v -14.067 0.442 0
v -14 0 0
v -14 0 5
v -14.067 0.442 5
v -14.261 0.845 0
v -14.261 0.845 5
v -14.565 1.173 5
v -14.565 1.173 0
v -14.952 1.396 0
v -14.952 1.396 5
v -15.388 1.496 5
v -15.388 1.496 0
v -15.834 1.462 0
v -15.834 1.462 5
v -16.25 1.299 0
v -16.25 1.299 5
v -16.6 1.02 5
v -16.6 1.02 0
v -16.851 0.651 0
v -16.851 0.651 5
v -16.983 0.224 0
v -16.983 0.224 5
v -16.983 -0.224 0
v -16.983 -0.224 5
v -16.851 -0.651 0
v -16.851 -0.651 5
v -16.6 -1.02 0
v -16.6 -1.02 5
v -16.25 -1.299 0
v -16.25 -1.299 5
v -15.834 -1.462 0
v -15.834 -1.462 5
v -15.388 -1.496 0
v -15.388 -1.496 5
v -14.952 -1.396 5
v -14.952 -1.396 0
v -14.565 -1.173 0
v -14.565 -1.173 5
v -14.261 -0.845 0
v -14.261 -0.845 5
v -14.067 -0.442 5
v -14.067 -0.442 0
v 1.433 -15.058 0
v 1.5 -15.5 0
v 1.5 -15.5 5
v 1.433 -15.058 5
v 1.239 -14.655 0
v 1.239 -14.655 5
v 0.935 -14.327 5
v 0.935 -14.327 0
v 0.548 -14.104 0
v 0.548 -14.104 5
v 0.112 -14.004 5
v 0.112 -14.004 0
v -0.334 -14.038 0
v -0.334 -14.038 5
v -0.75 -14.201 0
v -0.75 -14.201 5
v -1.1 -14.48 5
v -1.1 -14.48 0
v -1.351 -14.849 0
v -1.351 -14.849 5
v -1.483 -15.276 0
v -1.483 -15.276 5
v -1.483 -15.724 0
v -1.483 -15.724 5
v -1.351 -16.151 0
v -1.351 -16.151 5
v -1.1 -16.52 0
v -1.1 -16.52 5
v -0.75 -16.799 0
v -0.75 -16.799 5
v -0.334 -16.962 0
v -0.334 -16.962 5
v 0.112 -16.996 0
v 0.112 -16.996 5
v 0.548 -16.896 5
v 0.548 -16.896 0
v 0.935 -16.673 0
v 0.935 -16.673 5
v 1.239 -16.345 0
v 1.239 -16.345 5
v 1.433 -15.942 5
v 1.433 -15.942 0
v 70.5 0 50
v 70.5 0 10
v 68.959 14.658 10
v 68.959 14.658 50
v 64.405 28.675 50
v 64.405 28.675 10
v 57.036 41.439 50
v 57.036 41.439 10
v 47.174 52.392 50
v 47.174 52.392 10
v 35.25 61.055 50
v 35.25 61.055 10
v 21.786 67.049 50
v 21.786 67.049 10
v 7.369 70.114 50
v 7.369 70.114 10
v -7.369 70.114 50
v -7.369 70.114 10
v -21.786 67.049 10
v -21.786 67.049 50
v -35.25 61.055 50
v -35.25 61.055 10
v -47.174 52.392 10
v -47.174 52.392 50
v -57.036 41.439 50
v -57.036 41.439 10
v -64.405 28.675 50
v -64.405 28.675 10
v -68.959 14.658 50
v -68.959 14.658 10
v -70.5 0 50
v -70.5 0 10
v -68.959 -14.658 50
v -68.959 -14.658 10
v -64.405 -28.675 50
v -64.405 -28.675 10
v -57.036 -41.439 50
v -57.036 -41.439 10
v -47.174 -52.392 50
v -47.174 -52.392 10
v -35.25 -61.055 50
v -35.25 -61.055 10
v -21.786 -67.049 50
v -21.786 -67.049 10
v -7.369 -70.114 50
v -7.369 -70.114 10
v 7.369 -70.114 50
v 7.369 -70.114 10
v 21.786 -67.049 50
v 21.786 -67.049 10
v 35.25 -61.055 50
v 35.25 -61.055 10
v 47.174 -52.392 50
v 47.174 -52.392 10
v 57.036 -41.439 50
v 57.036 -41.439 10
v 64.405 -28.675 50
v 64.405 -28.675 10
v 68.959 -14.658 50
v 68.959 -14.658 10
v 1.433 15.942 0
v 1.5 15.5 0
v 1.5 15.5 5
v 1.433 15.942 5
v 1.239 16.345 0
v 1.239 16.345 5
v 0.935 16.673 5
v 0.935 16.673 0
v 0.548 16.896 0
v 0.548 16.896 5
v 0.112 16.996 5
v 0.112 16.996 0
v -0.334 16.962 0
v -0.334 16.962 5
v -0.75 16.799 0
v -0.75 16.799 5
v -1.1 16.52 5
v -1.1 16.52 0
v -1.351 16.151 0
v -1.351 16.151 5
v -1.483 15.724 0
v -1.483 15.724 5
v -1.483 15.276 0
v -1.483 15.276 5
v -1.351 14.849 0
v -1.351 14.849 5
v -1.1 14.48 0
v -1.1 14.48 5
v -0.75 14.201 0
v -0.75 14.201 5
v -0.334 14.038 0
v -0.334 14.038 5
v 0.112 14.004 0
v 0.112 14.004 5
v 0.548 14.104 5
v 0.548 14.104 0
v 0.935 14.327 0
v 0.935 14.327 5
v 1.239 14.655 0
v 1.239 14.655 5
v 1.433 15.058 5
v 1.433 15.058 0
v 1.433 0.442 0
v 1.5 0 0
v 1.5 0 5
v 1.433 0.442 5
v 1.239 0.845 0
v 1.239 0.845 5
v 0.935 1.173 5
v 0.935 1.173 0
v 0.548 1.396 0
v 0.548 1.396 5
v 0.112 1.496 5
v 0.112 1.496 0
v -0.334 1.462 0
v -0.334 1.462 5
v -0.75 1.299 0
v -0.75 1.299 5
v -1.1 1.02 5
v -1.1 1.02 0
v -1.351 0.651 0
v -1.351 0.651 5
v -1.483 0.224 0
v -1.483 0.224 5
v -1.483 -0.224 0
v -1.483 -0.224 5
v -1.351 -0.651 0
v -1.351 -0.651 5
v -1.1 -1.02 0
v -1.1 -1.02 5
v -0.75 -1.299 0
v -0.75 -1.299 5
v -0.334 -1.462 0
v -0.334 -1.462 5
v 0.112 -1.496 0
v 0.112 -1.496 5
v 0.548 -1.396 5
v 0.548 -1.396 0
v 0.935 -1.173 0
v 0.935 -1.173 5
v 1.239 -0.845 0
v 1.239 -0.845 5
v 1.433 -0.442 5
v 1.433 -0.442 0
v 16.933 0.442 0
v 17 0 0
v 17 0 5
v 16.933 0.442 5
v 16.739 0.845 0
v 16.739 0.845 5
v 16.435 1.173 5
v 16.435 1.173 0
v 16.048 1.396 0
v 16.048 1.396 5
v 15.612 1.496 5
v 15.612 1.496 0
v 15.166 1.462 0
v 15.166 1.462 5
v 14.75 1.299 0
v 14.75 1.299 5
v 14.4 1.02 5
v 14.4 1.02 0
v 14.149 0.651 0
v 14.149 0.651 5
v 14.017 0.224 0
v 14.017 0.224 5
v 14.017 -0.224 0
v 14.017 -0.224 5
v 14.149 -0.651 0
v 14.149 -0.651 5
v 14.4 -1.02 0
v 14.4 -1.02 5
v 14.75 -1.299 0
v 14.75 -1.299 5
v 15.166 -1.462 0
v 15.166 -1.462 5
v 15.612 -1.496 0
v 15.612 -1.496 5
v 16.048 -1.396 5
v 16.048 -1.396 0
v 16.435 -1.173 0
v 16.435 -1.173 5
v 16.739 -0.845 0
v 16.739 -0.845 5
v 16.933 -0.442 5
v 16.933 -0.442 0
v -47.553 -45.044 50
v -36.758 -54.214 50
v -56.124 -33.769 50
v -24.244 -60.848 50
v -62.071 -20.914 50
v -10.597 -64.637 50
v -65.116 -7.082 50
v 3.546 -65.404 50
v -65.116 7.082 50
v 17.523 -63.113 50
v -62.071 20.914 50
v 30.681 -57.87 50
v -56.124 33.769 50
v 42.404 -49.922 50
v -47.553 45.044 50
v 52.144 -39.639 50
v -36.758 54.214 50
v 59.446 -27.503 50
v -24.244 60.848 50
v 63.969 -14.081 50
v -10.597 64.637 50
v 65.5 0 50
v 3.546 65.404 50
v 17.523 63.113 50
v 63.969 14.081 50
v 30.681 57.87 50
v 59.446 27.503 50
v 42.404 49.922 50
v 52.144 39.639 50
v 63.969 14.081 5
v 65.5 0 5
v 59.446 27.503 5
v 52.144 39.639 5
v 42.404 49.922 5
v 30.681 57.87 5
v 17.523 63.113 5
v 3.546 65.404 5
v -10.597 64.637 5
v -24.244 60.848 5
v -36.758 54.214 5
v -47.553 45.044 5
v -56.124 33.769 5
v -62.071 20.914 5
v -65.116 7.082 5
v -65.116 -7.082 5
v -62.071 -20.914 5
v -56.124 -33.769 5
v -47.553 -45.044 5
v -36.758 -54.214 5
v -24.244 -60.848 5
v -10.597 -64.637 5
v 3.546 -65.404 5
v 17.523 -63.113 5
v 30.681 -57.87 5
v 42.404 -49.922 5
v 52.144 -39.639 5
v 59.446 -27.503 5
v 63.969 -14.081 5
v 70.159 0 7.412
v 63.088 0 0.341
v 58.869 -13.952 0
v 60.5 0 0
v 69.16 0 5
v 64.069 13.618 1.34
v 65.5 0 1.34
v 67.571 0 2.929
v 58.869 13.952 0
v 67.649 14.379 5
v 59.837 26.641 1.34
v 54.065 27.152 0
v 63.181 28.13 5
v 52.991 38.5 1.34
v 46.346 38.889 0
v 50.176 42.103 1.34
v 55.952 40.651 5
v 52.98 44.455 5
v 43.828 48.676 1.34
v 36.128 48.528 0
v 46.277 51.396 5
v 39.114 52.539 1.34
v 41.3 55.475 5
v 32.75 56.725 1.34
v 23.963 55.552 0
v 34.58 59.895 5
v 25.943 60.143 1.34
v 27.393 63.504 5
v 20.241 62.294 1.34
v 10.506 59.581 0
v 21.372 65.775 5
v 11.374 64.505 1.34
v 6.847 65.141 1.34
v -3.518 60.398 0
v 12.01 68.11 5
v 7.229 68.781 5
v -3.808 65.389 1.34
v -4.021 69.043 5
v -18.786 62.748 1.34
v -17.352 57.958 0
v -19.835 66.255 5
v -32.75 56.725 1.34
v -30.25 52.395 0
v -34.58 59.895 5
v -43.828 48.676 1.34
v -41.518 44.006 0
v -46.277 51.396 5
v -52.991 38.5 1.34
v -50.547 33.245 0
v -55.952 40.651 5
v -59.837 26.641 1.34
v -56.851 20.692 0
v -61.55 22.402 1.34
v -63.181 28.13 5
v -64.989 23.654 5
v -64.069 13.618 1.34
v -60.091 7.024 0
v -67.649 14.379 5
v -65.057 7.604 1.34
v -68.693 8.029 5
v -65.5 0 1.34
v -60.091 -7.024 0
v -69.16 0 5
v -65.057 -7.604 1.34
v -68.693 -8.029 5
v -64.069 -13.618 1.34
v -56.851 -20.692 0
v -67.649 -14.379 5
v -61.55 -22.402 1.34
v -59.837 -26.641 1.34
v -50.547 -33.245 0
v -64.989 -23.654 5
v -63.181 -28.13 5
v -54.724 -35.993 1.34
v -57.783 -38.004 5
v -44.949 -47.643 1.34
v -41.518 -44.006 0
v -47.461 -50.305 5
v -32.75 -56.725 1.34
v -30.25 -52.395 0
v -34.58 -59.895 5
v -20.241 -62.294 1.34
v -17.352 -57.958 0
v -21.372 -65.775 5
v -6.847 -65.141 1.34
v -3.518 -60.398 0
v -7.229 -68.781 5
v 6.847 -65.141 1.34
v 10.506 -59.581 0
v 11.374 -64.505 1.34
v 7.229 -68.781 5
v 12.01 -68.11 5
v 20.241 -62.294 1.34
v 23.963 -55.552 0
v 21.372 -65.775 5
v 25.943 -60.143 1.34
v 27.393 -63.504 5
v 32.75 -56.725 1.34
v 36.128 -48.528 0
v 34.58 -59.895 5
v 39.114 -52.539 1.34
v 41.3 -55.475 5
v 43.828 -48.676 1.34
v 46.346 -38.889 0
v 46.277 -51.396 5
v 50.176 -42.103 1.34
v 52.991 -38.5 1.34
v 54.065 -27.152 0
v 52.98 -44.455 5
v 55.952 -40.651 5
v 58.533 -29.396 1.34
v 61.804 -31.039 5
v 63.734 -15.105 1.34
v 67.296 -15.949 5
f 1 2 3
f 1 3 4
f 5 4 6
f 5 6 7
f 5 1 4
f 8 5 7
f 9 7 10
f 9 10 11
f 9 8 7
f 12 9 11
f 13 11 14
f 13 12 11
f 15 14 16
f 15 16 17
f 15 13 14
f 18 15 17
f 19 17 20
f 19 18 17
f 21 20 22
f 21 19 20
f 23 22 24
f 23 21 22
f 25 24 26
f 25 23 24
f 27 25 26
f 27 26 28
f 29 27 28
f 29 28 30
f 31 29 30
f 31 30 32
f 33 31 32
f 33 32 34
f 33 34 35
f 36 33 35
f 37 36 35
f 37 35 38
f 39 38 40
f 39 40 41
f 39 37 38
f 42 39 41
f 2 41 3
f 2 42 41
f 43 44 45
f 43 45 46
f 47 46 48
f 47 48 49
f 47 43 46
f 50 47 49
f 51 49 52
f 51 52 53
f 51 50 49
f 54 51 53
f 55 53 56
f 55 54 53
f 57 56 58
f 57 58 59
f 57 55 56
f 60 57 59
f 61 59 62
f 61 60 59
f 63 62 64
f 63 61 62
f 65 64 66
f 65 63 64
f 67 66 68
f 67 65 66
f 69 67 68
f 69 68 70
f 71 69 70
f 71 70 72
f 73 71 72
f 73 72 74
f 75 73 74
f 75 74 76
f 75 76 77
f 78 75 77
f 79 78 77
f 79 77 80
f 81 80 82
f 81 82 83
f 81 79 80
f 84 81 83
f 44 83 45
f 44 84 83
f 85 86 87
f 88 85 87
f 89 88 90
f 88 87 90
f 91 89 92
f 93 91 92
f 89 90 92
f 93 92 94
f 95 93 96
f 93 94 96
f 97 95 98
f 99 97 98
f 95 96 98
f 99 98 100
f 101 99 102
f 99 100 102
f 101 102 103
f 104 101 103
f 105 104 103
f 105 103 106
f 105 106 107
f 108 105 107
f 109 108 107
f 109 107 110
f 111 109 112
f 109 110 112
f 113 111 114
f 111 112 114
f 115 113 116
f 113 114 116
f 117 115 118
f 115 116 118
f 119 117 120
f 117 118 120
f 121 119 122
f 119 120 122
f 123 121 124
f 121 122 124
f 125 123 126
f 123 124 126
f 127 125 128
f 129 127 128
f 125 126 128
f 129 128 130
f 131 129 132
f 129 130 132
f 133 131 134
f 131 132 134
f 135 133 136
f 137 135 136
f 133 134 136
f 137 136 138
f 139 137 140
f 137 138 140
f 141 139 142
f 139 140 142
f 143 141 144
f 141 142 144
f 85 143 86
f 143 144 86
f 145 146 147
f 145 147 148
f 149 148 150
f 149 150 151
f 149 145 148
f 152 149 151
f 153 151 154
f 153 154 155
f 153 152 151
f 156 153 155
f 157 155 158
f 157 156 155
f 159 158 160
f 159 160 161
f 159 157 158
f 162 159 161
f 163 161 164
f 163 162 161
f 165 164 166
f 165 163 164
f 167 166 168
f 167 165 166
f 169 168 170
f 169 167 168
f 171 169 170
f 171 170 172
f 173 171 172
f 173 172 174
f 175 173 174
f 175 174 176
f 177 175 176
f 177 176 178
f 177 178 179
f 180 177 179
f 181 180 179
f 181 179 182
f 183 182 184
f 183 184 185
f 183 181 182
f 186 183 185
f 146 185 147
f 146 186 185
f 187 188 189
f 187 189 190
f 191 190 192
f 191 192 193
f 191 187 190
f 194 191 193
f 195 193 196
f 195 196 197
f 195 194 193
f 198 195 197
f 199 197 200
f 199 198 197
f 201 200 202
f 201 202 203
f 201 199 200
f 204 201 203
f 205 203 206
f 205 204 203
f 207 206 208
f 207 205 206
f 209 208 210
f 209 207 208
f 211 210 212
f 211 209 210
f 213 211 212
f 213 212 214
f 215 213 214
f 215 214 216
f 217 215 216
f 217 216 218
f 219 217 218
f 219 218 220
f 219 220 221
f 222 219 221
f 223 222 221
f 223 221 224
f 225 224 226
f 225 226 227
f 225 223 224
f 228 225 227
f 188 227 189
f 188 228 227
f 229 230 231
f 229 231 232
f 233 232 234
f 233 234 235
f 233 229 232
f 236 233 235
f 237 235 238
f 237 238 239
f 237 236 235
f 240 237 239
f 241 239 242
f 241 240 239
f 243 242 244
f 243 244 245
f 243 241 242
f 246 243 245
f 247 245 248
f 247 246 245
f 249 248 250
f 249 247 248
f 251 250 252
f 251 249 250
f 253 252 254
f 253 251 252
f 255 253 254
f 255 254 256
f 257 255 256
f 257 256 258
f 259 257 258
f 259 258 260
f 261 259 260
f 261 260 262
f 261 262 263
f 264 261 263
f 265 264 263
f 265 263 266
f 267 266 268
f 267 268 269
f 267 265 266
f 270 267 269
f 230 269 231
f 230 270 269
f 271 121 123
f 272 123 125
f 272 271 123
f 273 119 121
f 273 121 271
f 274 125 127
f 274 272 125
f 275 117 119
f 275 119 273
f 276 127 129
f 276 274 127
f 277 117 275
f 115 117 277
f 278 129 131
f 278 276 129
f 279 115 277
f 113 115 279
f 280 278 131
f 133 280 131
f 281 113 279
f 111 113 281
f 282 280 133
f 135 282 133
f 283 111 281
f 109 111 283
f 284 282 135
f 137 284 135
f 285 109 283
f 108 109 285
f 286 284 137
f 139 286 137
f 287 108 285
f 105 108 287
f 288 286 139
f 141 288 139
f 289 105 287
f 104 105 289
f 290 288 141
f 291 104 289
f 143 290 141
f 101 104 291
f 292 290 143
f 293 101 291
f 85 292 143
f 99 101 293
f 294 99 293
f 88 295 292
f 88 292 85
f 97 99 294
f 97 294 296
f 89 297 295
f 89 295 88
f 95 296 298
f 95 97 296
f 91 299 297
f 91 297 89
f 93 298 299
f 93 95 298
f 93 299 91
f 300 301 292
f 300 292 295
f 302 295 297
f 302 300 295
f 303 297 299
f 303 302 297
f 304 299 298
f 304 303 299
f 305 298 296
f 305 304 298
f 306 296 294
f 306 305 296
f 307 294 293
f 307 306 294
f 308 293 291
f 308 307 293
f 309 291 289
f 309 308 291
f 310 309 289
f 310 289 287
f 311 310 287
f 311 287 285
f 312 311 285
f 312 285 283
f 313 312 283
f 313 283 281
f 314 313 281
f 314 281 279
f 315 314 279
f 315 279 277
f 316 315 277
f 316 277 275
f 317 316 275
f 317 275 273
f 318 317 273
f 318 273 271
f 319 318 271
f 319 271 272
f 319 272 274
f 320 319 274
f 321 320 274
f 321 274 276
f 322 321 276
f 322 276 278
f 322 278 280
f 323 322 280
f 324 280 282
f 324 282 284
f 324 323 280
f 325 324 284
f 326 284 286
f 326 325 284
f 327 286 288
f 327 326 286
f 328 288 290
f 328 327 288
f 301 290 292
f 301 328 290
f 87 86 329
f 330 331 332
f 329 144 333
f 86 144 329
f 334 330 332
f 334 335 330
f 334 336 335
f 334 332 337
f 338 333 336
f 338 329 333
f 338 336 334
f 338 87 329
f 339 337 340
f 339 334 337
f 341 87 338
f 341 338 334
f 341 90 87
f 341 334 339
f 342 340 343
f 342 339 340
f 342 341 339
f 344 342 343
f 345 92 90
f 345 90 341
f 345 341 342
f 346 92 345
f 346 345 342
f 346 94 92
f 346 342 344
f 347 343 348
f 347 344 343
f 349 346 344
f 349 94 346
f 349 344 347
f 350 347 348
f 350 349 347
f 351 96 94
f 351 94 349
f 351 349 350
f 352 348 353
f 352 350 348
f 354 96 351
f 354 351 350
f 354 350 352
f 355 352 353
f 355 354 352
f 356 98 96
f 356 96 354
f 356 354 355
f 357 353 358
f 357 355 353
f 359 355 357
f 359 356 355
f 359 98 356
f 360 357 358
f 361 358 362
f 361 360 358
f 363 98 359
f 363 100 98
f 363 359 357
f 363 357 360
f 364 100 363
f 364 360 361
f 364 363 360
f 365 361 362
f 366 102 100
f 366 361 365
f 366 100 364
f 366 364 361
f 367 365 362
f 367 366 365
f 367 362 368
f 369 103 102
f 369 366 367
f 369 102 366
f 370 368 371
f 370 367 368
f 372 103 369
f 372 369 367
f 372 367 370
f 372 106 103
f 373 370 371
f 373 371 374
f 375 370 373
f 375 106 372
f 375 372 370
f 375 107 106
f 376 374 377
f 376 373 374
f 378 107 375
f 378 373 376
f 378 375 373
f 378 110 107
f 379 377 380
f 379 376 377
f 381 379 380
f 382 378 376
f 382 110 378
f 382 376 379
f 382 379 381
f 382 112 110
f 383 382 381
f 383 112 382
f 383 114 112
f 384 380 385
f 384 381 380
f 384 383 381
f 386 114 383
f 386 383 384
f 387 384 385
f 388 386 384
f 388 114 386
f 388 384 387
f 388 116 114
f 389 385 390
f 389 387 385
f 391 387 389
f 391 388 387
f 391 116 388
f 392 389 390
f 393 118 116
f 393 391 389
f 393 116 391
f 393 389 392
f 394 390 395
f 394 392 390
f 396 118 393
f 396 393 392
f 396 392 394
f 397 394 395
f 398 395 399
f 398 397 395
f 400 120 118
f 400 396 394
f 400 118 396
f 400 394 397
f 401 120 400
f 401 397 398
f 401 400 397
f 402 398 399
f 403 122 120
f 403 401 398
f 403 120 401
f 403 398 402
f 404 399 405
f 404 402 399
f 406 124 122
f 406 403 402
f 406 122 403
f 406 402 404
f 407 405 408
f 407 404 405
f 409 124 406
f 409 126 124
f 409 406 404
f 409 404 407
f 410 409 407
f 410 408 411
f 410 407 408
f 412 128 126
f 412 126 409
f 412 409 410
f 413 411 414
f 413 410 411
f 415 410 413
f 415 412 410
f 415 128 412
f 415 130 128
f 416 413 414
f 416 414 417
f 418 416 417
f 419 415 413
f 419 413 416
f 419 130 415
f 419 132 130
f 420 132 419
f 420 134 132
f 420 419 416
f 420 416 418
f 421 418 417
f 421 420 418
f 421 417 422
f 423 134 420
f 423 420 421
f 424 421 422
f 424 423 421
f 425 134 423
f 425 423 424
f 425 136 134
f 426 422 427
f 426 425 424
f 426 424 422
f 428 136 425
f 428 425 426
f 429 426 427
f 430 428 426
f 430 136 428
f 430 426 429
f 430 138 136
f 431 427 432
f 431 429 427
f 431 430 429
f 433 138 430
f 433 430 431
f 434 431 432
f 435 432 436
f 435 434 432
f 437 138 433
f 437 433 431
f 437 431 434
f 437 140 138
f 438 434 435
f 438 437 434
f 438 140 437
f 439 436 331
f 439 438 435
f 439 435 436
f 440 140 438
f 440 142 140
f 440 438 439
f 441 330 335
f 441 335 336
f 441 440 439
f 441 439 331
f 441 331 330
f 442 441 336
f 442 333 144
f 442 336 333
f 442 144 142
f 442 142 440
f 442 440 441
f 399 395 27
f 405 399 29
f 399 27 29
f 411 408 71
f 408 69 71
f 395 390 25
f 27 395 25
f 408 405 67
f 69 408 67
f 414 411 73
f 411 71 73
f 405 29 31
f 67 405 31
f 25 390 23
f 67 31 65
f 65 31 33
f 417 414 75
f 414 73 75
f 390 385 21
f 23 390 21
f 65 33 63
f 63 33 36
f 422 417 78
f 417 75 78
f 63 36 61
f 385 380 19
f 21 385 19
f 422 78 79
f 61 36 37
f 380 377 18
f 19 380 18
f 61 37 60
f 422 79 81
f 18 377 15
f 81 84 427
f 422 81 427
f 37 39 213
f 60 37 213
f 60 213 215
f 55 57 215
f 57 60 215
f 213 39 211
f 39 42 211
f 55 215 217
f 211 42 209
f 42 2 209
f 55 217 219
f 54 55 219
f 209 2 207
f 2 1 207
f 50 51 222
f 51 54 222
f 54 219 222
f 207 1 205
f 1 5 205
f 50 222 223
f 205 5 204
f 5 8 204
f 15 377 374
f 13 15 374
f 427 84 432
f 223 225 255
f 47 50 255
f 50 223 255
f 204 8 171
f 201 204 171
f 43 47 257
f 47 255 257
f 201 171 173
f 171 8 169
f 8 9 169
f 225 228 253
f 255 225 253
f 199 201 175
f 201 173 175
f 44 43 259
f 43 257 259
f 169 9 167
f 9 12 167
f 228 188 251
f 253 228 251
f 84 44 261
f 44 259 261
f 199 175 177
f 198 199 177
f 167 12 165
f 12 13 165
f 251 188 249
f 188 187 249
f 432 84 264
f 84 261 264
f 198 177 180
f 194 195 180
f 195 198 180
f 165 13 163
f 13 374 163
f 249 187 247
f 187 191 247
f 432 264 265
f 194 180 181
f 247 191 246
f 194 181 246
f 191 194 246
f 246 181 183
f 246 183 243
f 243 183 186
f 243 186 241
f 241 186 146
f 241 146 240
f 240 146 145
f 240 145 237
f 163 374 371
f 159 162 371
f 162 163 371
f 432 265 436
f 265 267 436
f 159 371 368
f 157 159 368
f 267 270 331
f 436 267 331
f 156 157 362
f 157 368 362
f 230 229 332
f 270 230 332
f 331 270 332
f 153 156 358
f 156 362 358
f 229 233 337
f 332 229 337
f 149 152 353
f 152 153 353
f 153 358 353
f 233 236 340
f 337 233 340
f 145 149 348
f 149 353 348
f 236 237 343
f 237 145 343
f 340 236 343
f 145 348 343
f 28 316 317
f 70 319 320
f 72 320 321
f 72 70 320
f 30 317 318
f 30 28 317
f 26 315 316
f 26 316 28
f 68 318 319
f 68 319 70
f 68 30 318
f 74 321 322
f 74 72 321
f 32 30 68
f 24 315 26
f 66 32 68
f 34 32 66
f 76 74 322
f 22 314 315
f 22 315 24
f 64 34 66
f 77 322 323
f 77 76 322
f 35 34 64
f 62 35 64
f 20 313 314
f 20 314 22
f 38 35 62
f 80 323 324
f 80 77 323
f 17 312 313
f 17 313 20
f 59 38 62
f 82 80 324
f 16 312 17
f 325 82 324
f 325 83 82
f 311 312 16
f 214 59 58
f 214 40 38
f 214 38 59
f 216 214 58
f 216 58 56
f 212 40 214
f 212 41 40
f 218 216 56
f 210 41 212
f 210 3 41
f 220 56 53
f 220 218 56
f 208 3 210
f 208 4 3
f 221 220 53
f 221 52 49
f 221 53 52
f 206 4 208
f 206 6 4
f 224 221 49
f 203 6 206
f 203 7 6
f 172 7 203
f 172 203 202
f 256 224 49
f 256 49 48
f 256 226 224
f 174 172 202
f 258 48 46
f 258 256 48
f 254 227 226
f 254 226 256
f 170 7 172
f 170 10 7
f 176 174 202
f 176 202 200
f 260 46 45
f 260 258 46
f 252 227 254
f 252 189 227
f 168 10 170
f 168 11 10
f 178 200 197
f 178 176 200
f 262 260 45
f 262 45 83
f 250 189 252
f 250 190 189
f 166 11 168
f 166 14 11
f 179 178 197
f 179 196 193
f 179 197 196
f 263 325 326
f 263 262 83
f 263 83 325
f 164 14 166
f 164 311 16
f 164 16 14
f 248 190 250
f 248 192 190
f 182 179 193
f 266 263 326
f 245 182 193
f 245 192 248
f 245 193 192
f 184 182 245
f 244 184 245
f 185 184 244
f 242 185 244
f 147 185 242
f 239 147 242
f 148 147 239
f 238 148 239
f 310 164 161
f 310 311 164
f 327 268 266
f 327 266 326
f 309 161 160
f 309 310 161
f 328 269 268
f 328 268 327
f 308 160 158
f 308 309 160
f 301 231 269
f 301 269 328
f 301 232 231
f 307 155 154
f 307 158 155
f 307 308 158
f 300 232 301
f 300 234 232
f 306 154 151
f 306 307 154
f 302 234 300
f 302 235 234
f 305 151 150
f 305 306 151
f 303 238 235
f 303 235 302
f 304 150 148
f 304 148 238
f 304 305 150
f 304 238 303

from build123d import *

# Parameters (mm, degrees)
CROQUIS1_R              = 70.5
CROQUIS1_R_2            = 1.5
SALIENTE_EXTRUIR1_DEPTH = 5
CROQUIS1_10_R           = 70.5
CROQUIS1_10_R_2         = 65.5
SALIENTE_EXTRUIR2_DEPTH = 50
REDONDEO1_R             = 10


with BuildPart() as part:
    # Croquis1 → Saliente-Extruir1 (new body)
    with BuildSketch(Plane.XY):
        Circle(CROQUIS1_R)
        with Locations((0, -15.5)):
            Circle(CROQUIS1_R_2, mode=Mode.SUBTRACT)
        with Locations((15.5, 0)):
            Circle(CROQUIS1_R_2, mode=Mode.SUBTRACT)
        with Locations((-15.5, 0)):
            Circle(CROQUIS1_R_2, mode=Mode.SUBTRACT)
        Circle(CROQUIS1_R_2, mode=Mode.SUBTRACT)
        with Locations((0, 15.5)):
            Circle(CROQUIS1_R_2, mode=Mode.SUBTRACT)
    extrude(amount=SALIENTE_EXTRUIR1_DEPTH)

    # Croquis1<10> → Saliente-Extruir2 (add)
    with BuildSketch(Plane.XY):
        Circle(CROQUIS1_10_R)
        Circle(CROQUIS1_10_R_2, mode=Mode.SUBTRACT)
    extrude(amount=SALIENTE_EXTRUIR2_DEPTH)

    # Redondeo1
    redondeo1_edges = [part.edges().sort_by_distance(p)[0] for p in [
        (-70.5, 0, 0),
    ]]
    fillet(redondeo1_edges, radius=REDONDEO1_R)


solid = part.part
